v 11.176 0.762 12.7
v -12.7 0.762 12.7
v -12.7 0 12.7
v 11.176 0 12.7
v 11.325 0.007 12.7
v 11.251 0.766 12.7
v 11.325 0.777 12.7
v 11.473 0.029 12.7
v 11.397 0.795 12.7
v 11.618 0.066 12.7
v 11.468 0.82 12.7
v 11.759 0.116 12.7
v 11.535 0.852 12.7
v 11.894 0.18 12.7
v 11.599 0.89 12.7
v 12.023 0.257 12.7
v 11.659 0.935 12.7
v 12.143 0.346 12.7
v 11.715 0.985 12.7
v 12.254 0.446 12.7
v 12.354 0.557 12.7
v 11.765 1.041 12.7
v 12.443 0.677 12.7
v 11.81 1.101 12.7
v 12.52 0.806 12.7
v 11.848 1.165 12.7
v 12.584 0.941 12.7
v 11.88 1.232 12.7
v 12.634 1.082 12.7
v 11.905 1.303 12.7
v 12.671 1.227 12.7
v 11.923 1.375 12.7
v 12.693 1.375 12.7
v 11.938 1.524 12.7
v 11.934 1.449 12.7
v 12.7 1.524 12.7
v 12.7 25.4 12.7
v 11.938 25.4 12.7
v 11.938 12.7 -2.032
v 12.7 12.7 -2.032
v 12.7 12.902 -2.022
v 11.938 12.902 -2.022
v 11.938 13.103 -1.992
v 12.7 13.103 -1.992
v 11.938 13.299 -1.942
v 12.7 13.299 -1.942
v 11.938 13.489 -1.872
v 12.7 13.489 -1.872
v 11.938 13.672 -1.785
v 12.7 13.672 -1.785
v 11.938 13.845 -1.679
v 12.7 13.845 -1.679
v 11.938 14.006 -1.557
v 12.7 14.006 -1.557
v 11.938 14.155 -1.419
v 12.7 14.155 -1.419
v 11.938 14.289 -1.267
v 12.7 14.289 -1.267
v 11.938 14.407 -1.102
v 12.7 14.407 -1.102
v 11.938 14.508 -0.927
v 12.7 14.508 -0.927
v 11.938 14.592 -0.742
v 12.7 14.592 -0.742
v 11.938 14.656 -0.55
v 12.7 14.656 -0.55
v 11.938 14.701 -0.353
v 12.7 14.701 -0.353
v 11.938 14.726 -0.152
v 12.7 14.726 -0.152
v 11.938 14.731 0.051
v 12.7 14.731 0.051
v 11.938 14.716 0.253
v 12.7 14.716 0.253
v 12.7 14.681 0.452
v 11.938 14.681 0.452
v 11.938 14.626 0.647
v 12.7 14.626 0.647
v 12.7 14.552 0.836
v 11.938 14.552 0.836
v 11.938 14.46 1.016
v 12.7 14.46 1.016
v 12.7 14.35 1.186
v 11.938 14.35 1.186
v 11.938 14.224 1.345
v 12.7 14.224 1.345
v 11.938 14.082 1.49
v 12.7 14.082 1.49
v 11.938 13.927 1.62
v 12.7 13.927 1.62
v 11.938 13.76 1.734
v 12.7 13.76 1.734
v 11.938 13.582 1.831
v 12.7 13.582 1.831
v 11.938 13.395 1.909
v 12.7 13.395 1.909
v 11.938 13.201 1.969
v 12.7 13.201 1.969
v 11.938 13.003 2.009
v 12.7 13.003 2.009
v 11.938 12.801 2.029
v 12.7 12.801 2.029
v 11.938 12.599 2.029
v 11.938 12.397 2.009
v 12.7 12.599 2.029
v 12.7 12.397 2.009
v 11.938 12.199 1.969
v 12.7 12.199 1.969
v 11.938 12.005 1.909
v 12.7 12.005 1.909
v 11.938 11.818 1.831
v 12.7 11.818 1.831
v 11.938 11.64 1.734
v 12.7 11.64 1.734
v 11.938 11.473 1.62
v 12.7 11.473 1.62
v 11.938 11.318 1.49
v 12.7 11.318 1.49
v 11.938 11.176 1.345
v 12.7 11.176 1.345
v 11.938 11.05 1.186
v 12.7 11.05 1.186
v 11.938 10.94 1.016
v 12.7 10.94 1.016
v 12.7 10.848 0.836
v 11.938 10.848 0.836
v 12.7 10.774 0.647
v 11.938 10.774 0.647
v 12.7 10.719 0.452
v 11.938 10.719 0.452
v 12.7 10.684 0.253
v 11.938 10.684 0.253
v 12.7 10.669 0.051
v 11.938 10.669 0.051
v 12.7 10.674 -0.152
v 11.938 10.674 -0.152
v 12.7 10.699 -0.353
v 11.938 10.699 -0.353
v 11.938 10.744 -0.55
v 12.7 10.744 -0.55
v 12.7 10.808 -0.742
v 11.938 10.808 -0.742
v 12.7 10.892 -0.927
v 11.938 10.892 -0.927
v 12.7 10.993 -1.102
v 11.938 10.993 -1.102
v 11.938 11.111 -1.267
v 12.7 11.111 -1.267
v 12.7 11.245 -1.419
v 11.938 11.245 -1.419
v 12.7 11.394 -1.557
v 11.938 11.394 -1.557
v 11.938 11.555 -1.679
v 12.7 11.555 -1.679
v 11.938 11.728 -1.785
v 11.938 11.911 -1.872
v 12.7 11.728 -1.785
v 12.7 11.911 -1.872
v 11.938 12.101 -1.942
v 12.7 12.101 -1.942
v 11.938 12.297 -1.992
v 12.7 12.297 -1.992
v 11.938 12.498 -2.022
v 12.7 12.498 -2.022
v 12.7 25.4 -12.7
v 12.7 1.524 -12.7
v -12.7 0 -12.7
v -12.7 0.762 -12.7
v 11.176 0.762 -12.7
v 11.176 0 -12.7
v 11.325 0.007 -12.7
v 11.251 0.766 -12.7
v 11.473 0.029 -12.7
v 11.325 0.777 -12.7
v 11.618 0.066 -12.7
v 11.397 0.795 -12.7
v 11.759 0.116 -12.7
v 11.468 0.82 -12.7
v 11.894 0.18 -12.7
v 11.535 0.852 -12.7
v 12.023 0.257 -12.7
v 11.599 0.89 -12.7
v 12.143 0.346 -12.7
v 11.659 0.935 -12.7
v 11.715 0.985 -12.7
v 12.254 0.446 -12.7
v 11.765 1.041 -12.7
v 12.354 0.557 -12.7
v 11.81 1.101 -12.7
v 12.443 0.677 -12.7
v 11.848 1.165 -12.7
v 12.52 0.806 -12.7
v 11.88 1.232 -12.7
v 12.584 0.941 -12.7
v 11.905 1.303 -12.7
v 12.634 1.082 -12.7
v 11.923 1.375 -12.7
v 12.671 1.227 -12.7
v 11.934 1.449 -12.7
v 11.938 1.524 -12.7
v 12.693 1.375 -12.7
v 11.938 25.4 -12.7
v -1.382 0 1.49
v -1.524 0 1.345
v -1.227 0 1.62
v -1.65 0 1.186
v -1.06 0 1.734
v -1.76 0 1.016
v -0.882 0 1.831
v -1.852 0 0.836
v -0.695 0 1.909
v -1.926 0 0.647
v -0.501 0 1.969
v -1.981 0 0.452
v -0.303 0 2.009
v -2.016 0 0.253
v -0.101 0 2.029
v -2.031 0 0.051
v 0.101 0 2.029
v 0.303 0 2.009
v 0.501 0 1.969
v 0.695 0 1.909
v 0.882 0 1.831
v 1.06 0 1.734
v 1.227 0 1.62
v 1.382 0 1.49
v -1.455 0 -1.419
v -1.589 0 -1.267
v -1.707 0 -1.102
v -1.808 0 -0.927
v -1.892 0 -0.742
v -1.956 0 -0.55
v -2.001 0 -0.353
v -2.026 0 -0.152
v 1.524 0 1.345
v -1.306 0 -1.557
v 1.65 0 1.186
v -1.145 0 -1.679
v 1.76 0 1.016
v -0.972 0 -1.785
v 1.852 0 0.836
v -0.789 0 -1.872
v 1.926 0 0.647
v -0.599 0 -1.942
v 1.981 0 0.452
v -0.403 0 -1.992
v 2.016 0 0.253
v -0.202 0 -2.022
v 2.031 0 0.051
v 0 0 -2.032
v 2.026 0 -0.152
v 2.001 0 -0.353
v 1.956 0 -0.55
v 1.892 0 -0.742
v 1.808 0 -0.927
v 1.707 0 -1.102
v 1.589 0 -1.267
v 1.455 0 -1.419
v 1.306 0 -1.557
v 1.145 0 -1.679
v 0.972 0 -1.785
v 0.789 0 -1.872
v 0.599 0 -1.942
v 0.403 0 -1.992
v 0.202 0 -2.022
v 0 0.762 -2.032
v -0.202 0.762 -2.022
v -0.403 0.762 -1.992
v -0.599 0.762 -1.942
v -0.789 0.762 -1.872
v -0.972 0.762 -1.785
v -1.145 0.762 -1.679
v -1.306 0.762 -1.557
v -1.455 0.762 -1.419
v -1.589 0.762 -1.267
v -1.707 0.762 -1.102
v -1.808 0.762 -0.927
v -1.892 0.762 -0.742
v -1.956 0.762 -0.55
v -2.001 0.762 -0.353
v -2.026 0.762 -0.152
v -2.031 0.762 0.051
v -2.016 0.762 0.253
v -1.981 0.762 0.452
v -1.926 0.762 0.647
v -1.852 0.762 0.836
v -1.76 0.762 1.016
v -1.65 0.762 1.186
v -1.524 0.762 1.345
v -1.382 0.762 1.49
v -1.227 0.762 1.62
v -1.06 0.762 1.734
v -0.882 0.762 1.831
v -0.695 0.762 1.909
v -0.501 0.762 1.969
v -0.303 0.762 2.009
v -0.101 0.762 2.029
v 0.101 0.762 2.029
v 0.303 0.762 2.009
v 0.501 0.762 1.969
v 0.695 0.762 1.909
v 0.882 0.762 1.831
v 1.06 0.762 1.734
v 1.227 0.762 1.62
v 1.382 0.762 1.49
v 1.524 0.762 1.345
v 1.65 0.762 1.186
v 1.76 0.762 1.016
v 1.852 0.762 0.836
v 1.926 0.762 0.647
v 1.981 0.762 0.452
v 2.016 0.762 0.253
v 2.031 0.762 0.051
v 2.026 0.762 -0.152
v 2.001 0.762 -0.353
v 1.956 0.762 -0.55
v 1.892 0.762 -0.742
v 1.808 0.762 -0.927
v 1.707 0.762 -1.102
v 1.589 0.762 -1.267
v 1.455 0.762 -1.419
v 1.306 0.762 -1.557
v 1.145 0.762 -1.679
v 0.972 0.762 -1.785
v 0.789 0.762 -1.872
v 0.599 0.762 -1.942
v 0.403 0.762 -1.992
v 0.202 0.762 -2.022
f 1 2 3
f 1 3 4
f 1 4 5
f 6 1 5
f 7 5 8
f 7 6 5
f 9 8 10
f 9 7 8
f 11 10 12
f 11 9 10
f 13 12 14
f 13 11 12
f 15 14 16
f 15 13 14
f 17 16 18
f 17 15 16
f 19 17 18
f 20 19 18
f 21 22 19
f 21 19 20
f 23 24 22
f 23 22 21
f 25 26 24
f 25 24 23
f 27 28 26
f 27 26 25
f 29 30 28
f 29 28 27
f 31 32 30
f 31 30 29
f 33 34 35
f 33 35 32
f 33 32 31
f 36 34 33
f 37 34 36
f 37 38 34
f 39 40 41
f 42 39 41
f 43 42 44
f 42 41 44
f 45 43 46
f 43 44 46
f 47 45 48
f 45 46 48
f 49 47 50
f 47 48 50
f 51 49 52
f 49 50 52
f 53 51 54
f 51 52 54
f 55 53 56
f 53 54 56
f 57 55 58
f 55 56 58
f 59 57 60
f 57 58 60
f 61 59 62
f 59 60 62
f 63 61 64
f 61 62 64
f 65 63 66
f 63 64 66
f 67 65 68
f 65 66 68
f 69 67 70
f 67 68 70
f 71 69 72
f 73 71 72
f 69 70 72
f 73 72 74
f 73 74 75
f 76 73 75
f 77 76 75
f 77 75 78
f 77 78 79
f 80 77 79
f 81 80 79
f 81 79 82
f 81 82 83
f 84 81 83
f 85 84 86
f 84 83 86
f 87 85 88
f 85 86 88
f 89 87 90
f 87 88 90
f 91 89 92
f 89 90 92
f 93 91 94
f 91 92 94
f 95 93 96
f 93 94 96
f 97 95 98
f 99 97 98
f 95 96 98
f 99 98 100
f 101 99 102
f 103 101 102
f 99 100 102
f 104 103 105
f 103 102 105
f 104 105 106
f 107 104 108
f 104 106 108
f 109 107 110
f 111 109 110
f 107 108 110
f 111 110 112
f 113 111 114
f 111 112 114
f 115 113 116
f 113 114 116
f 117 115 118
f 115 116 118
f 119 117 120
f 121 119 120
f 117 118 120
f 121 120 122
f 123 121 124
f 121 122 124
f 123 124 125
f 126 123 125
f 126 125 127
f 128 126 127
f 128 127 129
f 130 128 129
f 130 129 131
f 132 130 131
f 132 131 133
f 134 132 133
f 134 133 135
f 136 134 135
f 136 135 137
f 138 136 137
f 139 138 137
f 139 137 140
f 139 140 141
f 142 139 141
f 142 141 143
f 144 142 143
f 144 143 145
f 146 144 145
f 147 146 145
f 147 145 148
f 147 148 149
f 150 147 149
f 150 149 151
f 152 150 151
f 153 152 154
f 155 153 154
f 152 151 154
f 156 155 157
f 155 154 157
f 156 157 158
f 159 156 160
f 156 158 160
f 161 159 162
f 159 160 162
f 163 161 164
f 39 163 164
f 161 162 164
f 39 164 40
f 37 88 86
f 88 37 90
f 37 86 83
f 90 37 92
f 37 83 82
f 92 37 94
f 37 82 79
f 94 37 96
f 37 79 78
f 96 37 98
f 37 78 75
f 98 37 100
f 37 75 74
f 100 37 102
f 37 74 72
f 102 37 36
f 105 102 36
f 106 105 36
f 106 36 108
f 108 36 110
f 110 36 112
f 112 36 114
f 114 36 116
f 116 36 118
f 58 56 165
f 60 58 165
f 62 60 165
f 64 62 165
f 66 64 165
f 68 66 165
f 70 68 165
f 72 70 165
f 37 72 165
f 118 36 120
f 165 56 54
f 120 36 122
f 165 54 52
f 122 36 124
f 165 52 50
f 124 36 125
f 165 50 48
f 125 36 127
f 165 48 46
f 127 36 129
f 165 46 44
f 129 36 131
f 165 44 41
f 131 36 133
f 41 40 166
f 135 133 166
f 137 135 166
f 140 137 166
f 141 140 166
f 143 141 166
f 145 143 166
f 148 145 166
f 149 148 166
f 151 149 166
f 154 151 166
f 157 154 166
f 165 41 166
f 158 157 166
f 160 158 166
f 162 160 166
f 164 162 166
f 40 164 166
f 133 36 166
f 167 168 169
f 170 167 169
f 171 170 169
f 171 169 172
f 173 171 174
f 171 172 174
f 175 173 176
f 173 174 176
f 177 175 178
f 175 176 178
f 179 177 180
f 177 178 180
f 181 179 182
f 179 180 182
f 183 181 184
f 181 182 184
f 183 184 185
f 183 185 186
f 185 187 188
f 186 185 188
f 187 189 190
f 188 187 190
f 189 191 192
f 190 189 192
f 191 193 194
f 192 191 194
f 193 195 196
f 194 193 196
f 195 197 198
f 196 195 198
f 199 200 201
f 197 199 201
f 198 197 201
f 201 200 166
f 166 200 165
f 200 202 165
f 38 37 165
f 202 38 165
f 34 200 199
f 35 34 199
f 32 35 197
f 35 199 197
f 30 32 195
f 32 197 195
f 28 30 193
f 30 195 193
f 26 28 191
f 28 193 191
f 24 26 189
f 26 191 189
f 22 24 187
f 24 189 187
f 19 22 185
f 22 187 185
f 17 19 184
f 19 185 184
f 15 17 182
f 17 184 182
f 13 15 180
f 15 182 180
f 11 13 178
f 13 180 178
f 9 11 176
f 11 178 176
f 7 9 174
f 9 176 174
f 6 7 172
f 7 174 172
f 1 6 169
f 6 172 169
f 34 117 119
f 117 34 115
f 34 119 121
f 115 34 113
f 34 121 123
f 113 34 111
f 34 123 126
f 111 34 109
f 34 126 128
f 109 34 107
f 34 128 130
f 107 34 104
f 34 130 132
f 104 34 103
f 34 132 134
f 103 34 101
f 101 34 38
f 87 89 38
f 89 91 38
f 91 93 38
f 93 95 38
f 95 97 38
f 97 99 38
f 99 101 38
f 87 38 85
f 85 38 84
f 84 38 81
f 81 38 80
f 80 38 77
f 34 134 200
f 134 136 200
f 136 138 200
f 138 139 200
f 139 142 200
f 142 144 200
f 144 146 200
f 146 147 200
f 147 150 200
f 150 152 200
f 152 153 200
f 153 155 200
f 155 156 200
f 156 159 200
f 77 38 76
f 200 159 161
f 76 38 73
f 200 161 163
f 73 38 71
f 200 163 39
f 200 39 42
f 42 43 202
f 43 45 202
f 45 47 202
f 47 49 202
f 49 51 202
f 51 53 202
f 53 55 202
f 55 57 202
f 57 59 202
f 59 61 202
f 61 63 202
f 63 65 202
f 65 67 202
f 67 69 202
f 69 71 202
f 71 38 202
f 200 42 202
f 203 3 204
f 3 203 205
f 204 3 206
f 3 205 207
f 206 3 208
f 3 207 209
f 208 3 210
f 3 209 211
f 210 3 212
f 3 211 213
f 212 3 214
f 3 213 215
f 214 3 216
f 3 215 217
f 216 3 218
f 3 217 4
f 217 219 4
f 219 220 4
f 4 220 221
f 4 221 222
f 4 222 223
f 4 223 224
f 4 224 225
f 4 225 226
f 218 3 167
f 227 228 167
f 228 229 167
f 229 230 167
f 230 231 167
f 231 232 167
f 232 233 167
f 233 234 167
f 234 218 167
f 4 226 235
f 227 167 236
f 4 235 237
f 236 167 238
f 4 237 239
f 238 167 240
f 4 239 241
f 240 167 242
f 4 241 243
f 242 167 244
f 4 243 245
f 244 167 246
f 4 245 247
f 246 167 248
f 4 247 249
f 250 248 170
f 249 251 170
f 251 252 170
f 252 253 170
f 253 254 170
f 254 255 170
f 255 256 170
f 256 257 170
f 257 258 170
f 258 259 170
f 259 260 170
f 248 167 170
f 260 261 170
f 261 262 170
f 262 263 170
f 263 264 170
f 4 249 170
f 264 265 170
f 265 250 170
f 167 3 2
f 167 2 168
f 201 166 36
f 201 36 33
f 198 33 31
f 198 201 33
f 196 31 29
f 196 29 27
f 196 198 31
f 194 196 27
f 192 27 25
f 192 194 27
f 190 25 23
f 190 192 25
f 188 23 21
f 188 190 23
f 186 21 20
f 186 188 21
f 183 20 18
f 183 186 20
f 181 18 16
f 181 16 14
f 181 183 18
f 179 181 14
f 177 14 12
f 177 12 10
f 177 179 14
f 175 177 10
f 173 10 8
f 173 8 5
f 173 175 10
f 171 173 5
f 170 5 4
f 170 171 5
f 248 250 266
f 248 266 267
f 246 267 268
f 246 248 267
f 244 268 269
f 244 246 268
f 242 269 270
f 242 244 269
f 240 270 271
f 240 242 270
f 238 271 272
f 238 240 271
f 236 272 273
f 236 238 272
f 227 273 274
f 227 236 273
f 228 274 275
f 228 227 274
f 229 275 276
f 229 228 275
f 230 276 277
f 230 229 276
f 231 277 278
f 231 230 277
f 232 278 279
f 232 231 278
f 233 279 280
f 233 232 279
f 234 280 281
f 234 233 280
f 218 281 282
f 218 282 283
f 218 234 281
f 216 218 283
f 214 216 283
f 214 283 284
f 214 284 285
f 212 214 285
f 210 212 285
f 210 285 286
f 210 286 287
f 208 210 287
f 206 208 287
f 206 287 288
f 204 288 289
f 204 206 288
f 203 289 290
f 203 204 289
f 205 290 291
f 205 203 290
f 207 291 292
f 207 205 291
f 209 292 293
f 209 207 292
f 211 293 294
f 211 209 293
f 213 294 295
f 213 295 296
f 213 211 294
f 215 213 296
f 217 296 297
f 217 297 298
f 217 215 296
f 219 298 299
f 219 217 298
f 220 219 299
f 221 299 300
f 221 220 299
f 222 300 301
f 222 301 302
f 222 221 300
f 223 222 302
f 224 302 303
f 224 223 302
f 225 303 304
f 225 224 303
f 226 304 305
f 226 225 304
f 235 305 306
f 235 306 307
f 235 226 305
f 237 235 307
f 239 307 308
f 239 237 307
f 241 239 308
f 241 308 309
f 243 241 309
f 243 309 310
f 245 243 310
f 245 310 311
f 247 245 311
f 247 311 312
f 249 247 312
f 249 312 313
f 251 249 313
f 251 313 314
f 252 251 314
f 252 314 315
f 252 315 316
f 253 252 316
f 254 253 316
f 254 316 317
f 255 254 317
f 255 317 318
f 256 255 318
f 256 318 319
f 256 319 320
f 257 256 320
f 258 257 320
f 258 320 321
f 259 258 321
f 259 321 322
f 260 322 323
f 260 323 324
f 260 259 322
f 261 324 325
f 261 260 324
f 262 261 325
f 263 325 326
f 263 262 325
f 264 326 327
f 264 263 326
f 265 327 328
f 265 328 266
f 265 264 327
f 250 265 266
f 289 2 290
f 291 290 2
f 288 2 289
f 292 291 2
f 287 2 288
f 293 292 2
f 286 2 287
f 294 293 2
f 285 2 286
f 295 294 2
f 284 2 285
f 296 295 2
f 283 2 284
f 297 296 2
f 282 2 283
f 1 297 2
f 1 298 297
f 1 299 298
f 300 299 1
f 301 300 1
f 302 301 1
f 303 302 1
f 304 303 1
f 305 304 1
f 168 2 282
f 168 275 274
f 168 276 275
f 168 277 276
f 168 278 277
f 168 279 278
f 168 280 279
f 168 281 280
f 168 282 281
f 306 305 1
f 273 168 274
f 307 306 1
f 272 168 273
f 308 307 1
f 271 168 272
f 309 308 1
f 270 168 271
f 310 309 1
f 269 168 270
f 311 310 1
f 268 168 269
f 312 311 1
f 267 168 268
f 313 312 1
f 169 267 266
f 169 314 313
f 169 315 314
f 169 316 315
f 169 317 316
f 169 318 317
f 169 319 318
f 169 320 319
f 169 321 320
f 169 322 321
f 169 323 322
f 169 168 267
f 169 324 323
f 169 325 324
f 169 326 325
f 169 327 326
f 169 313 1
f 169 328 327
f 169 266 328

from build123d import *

# Parameters (mm, degrees)
SKETCH1_W              = 25.4
SKETCH1_H              = 25.4
SKETCH1_R              = 2.032
BOSS_EXTRUDE1_DEPTH    = 0.762
SKETCH2_W              = 25.4
SKETCH2_H              = 25.4
SKETCH2_R              = 2.032
BOSS_EXTRUDE2_DEPTH    = 0.762
CONVERT_SOLID1_START   = -12.7
CONVERT_SOLID1_DEPTH   = 25.4
CONVERT_SOLID1_2_DEPTH = 25.4


# Read off the part's stored shape, not the designer's step: Convert-Solid1
with BuildPart() as part:
    # Sketch1 → Boss-Extrude1 (new body)
    with BuildSketch(Plane(origin=(0, 0, 0), x_dir=(1, 0, 0), z_dir=(0, 1, 0))):
        Rectangle(SKETCH1_W, SKETCH1_H)
        with Locations(Location((0, 0, 0), (0, 0, 90))):
            Circle(SKETCH1_R, mode=Mode.SUBTRACT)
    extrude(amount=BOSS_EXTRUDE1_DEPTH)

    # Sketch2 → Boss-Extrude2 (add)
    with BuildSketch(Plane(origin=(12.7, 0, 0), x_dir=(0, 0, -1), z_dir=(1, 0, 0))):
        with Locations((0, 12.7)):
            Rectangle(SKETCH2_W, SKETCH2_H)
        with Locations((0, 12.7)):
            Circle(SKETCH2_R, mode=Mode.SUBTRACT)
    extrude(amount=-BOSS_EXTRUDE2_DEPTH)

    # Convert-Solid1 outline → Convert-Solid1 (cut)
    with BuildSketch(Plane.XY.offset(CONVERT_SOLID1_START)):
        with BuildLine():
            Line((12.7, 0), (12.7, 1.524))
            ThreePointArc((12.7, 1.524), (12.253630735, 0.446369265), (11.176, 0))
            Line((11.176, 0), (12.7, 0))
        make_face()
    extrude(amount=CONVERT_SOLID1_DEPTH, mode=Mode.SUBTRACT)

    # Convert-Solid1 2 outline → Convert-Solid1 2 (add)
    with BuildSketch(Plane.XY.offset(CONVERT_SOLID1_START)):
        with BuildLine():
            Line((11.938, 0.762), (11.938, 1.524))
            ThreePointArc((11.938, 1.524), (11.714815367, 0.985184633), (11.176, 0.762))
            Line((11.176, 0.762), (11.938, 0.762))
        make_face()
    extrude(amount=CONVERT_SOLID1_2_DEPTH)


solid = part.part
